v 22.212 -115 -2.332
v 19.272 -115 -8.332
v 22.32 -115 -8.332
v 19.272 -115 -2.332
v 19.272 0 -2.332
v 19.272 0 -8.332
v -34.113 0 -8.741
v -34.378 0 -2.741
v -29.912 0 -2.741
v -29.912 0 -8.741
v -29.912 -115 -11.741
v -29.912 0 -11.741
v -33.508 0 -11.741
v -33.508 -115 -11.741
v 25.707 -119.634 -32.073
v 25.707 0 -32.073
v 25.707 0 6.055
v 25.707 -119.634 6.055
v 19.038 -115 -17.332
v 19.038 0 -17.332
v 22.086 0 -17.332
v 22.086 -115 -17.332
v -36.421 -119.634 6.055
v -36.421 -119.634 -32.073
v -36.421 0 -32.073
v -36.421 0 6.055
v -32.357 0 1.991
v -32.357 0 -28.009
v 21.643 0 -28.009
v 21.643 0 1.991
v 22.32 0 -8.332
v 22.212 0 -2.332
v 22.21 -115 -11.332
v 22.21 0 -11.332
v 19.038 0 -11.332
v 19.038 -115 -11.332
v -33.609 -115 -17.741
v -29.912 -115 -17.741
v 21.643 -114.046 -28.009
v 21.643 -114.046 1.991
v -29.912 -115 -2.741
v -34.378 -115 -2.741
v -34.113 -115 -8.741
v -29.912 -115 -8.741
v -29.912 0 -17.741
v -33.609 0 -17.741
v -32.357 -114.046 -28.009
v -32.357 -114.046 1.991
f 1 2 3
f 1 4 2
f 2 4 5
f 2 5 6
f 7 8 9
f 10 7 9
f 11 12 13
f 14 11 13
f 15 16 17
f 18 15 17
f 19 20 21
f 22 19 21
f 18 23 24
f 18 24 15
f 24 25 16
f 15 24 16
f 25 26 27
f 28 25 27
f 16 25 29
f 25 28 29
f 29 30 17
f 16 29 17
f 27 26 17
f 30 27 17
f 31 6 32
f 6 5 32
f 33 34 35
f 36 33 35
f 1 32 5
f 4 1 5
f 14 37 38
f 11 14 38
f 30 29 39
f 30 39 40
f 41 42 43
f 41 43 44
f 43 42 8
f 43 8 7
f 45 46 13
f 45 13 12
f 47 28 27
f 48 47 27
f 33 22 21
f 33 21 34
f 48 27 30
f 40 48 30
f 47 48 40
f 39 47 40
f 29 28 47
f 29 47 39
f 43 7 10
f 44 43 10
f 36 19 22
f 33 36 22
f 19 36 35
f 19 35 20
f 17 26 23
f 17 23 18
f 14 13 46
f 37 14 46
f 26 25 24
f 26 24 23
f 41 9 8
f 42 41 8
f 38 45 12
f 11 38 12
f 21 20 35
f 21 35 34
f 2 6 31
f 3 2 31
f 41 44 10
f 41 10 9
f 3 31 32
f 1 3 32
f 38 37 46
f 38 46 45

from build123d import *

# Parameters (mm, degrees)
F0_W     = 54
F0_H     = 30
F1_DEPTH = 115
F2_W     = 62.128
F2_H     = 38.128
F3_DEPTH = 119.634
F4_DEPTH = 25.4
F5_DEPTH = 114.046
F7_DEPTH = 115


with BuildPart() as f1:
    # F0 (on Front) → F1 (new body)
    with BuildSketch(Plane.XZ):
        with Locations((-5.357128, -13.008541)):
            Rectangle(F0_W, F0_H)
    extrude(amount=F1_DEPTH)

    # F2 (on Front) → F3 (join)
    with BuildSketch(Plane.XZ):
        with Locations((-5.357128, -13.008541)):
            Rectangle(F2_W, F2_H)
    extrude(amount=F3_DEPTH)

    # F0 (on Front) → F4 (cut)
    with BuildSketch(Plane.XZ):
        with Locations((-5.357128, -13.008541)):
            Rectangle(F0_W, F0_H)
    extrude(amount=-F4_DEPTH, mode=Mode.SUBTRACT)

    # F0 (on Front) → F5 (cut)
    with BuildSketch(Plane.XZ):
        with Locations((-5.357128, -13.008541)):
            Rectangle(F0_W, F0_H)
    extrude(amount=F5_DEPTH, mode=Mode.SUBTRACT)


with BuildPart() as f7:
    # F6 (on Front) → F7 (new body)
    with BuildSketch(Plane.XZ):
        Polygon((22.086273, -17.331536), (22.209849, -11.331536), (19.038273, -11.331536), (19.038273, -17.331536), align=None)
        Polygon((19.272029, -8.331536), (22.320029, -8.331536), (22.212252, -2.331536), (19.272029, -2.331536), align=None)
        Polygon((-29.912125, -8.741442), (-29.912125, -2.741442), (-34.377902, -2.741442), (-34.112774, -8.741442), align=None)
        Polygon((-29.912125, -17.741442), (-29.912125, -11.741442), (-33.507682, -11.741442), (-33.60853, -17.741442), align=None)
    extrude(amount=F7_DEPTH)


solid = Compound([f1.part, f7.part])
